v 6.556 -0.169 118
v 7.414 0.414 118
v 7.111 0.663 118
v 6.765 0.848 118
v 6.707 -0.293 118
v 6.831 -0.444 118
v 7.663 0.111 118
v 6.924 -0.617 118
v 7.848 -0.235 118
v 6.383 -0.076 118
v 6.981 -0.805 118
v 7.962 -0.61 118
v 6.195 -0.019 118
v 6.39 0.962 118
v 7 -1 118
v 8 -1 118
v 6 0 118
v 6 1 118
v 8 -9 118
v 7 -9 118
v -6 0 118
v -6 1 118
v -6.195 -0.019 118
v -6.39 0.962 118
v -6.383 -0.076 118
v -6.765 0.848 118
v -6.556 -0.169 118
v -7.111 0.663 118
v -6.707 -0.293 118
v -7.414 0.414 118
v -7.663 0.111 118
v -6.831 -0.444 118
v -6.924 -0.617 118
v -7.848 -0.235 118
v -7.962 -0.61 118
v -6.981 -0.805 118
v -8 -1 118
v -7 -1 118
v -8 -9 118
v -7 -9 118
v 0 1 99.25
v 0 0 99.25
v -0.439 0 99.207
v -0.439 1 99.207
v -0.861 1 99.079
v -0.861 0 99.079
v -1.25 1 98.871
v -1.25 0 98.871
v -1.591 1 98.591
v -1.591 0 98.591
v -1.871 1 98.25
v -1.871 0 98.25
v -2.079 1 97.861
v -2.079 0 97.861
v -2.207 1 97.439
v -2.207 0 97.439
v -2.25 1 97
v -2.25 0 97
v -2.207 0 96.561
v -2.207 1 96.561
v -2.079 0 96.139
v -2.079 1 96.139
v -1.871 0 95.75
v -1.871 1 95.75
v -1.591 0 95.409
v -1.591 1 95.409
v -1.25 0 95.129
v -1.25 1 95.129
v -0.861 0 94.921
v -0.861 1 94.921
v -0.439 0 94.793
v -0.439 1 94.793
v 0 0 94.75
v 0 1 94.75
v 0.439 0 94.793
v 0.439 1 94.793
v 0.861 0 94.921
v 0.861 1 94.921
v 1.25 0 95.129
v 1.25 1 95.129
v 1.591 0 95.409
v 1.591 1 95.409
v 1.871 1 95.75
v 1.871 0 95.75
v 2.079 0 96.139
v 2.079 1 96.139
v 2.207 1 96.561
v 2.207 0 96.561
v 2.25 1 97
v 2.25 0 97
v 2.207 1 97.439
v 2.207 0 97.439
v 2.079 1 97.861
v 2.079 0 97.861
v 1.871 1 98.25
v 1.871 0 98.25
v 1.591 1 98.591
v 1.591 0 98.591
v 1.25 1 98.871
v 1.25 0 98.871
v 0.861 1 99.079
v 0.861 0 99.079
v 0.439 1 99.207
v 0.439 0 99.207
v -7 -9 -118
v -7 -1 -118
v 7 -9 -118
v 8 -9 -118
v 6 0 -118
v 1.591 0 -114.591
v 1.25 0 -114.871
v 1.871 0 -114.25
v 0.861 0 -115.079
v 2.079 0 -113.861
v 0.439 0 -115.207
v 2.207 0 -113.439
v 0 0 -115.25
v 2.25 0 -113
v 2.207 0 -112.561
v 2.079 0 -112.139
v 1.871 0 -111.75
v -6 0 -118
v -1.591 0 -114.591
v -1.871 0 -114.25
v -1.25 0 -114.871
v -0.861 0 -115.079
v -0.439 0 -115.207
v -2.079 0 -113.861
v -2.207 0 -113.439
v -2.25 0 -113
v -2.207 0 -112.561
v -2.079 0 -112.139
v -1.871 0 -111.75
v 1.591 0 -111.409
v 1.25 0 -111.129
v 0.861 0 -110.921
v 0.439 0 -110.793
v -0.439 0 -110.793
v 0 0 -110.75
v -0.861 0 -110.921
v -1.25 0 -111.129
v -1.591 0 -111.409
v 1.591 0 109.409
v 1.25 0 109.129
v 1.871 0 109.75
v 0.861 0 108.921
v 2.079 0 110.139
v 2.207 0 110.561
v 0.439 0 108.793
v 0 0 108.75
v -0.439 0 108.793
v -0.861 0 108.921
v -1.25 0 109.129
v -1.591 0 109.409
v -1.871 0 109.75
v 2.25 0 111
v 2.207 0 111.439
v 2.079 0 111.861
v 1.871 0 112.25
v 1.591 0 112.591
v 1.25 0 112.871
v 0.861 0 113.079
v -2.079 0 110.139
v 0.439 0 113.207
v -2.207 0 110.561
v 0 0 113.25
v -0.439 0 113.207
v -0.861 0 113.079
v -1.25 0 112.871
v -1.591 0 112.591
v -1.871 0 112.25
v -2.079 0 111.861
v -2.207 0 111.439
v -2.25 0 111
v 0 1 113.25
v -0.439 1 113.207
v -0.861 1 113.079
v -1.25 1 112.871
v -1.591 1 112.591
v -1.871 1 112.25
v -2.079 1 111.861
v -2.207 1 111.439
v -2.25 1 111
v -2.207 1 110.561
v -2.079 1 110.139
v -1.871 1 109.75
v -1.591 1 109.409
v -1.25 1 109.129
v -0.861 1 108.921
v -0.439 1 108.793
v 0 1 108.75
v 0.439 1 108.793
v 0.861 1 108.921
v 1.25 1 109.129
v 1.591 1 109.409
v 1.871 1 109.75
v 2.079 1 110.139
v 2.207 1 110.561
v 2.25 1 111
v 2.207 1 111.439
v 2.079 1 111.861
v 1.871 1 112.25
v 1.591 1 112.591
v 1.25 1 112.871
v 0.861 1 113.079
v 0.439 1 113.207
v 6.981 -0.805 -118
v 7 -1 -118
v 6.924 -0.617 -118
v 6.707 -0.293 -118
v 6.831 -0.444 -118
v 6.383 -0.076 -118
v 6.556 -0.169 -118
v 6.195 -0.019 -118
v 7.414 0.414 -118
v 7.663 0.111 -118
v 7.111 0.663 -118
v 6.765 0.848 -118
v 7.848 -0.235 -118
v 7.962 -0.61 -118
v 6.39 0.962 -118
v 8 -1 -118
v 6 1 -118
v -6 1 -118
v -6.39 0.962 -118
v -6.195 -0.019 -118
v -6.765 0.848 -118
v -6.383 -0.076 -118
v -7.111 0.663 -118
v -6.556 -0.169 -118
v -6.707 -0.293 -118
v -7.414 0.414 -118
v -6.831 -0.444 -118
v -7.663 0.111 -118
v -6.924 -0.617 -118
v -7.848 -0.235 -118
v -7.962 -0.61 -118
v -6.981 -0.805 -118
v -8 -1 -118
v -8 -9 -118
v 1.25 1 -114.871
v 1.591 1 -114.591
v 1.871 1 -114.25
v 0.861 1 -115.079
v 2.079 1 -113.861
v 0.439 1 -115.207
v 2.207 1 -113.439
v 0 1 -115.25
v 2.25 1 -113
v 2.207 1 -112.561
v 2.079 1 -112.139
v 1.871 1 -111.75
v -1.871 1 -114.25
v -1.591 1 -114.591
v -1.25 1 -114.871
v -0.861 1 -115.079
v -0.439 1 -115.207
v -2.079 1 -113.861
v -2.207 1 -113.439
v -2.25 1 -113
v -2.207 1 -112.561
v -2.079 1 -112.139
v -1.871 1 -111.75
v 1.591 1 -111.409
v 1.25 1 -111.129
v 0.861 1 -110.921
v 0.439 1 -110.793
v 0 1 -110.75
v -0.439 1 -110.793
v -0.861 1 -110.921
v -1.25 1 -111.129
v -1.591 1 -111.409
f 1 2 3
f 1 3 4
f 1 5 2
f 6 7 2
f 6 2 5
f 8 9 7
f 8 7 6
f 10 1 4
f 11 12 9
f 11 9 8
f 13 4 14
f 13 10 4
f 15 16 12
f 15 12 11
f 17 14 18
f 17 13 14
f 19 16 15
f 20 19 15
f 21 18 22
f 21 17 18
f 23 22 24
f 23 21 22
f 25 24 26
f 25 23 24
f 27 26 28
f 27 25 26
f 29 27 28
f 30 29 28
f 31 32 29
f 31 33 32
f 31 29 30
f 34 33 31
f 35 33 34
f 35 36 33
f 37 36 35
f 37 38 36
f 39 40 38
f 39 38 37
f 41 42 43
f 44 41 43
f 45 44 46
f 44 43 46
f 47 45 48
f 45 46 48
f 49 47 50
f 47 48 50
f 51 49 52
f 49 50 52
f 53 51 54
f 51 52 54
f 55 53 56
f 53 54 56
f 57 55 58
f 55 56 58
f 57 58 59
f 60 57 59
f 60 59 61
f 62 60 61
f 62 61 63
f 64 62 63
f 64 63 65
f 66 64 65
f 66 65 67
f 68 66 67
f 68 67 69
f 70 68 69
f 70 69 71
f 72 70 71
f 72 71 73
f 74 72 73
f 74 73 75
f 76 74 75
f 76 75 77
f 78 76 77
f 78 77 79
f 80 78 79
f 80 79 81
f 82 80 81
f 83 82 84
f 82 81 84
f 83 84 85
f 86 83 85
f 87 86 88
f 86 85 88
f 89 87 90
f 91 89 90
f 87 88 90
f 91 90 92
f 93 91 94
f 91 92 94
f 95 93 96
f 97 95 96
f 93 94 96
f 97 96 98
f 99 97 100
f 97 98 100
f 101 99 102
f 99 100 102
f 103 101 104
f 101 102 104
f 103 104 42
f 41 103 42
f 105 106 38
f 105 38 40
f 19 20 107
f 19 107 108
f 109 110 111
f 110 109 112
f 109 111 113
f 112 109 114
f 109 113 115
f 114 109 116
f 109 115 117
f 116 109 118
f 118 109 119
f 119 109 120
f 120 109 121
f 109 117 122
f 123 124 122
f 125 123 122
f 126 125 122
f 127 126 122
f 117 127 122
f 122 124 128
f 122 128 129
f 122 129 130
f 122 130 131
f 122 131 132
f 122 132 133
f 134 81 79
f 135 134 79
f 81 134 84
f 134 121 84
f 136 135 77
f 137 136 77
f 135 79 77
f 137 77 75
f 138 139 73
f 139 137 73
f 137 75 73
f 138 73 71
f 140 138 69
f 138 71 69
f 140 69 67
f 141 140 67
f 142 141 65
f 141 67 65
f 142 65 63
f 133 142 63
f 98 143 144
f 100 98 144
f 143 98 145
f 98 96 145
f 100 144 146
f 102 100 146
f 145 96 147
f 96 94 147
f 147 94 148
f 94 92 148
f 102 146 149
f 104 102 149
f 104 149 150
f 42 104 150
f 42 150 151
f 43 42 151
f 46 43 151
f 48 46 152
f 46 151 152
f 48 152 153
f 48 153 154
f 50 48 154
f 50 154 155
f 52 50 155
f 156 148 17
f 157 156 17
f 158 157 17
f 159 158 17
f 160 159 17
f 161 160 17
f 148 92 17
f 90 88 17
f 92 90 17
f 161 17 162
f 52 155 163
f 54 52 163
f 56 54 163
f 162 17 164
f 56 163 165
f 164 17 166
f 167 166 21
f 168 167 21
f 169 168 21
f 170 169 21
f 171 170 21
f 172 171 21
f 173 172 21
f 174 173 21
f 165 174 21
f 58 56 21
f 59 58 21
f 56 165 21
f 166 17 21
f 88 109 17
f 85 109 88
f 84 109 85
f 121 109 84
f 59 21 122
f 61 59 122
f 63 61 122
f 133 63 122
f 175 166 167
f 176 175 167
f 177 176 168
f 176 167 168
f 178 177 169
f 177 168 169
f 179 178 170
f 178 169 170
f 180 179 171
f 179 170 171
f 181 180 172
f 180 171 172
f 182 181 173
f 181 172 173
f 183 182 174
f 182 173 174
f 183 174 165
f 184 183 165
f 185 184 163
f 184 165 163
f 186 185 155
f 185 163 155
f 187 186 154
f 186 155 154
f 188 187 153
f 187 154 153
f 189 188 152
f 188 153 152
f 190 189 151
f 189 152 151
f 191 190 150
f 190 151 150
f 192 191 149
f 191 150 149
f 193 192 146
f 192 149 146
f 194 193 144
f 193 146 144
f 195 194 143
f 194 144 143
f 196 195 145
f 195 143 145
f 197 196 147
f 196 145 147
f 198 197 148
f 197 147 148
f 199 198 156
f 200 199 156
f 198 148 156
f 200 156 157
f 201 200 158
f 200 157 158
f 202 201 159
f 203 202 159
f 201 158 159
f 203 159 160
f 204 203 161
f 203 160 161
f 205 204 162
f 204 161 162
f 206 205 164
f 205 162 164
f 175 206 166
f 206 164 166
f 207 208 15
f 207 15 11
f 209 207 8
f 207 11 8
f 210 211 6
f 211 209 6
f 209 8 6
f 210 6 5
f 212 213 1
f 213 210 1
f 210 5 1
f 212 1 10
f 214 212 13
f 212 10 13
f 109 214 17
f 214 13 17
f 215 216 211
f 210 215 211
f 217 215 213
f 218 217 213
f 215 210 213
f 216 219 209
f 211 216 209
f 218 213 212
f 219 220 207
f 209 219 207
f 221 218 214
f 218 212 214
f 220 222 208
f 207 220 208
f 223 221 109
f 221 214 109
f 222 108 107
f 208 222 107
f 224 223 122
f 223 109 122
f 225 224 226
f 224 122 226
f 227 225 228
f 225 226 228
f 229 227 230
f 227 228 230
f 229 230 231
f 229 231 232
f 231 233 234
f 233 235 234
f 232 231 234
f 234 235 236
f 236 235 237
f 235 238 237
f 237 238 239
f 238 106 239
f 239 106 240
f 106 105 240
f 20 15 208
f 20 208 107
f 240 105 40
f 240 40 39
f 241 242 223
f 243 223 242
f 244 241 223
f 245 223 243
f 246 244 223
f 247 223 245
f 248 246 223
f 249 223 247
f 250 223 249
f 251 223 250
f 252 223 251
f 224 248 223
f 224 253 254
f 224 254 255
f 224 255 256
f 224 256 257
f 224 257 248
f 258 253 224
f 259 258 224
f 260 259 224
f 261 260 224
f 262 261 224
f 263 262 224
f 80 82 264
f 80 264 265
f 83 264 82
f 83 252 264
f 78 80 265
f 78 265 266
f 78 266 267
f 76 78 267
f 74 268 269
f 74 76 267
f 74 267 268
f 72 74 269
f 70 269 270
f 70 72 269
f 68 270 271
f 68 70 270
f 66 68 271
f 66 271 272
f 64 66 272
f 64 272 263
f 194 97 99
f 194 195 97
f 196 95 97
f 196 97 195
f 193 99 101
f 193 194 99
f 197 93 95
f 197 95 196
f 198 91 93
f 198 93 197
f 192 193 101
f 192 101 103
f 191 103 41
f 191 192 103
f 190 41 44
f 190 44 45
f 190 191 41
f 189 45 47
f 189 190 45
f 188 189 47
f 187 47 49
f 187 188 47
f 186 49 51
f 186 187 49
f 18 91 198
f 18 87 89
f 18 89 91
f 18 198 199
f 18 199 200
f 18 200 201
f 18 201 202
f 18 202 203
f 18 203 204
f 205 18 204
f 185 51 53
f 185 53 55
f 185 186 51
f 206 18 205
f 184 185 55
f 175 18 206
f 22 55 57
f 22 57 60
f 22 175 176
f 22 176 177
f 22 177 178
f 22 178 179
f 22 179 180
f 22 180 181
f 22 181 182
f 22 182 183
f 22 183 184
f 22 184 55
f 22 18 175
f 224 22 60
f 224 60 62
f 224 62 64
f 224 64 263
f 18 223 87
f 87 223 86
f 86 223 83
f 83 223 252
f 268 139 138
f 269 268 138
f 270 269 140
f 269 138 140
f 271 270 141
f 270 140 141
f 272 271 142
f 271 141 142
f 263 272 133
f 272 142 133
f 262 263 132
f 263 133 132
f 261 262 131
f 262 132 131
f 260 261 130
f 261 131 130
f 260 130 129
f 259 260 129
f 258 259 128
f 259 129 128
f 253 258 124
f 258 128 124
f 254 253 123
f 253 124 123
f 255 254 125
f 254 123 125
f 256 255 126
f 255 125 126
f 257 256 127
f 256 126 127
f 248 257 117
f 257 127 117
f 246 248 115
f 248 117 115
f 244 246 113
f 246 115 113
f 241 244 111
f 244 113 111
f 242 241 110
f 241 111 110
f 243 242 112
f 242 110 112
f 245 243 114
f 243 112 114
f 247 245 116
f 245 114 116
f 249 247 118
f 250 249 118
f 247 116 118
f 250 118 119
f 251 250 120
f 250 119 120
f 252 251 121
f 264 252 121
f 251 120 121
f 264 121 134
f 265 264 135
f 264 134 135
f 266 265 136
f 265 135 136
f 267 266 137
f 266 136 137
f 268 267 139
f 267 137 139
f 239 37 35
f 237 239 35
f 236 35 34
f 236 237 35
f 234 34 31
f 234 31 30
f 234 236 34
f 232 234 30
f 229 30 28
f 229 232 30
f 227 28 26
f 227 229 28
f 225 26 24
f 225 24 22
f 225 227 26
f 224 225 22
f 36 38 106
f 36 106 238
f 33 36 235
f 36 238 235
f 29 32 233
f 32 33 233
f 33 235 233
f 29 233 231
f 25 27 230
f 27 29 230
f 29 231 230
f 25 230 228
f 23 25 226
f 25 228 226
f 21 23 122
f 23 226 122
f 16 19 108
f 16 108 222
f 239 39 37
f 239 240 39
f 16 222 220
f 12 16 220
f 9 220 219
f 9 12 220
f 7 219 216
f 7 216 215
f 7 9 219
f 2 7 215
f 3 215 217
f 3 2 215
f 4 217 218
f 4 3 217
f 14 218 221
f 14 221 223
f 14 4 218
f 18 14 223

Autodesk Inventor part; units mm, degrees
ref_plane "YZ Plane" through (0, 0, 0) normal (1, 0, 0) x (0, 1, 0)
ref_plane "XZ Plane" through (0, 0, 0) normal (0, 1, 0) x (-1, 0, 0)
ref_plane "XY Plane" through (0, 0, 0) normal (0, 0, 1) x (1, 0, 0)
sketch "Esquisse4" plane through (0, 0, 0) normal (0, 1, 0) x (-1, 0, 0)
  line L0 (-8, 118) -> (8, 118)
  line L1 (8, 118) -> (8, -118)
  line L2 (8, -118) -> (-8, -118)
  line L3 (-8, -118) -> (-8, 118)
  line L4 (-8, 118) -> (8, -118) construction
  line L5 (8, 118) -> (-8, -118) construction
  point P0 (0, 0)
  dimension "d26" = 16
  dimension "d27" = 236
extrude "Plaque3" add sketch "Esquisse4" along normal blind 1
sketch "Esquisse5" plane through (7, 1, 118) normal (1, 0, 0) x (0, 1, 0)
  line L0 (0, -236) -> (0, 0)
  line L1 (0, 0) -> (-10, 0)
  line L2 (-10, 0) -> (-10, -236)
  line L3 (-10, -236) -> (0, -236)
edge flange "Bord tombé2" height 10 angle 90 thickness 1 bend radius 1 thickness toward (1, 0, 0) relief tear relief width 1 relief depth 0.5 corner gap 1 corner form 0 edges at (8, 0, 0) (-8, 0, 0) wall of the first edge with corners at (7, 1, -118) (7, 1, 118) (7, -9, 118) (7, -9, -118)
bend "Pli2"
corner "Coin2"
sketch "Esquisse6" plane through (0, 1, 0) normal (0, 1, 0) x (1, 0, 0)
  line L0 (-6, 118) -> (6, 118) projected
  point P0 (0, 0)
  point P1 (0, 113)
  point P2 (0, 118)
  dimension "d39" = 5
hole "Perçage2" at (0, 1, -113) direction (0, -1, 0) diameter 4.5 depth 1 clearance for "Vis d'assemblage à six pans creux ISO 4762" size "M4" standard "ISO"
sketch "Esquisse7" plane through (0, 1, 0) normal (0, 1, 0) x (1, 0, 0)
  line L0 (-6, 118) -> (6, 118) projected
  point P0 (0, 0)
  point P1 (0, -97)
  point P2 (0, -111)
  dimension "d50" = 215
  dimension "d51" = 14
hole "Perçage3" at (0, 1, 97) at (0, 1, 111) direction (0, -1, 0) diameter 4.5 depth 1 clearance for "Vis d'assemblage à six pans creux ISO 4762" size "M4" standard "ISO"
equation "\"d45\" = Epaisseur"
equation "\"d57\" = Epaisseur"
equation "\"d28\" = Epaisseur"
equation "\"d29\" = LargeurGrugeage"
equation "\"d30\" = ProfondeurGrugeage"
equation "\"d31\" = RestesMinimum"
equation "\"d32\" = Rayondetransition"
equation "\"d35\" = RayonPli"
equation "\"d36\" = TailleGrugeage"
equation "\"d37\" = TailleJeu"
equation "\"d38\" = TailleRayonJacobi"
equation "\"RayonPli\" = Epaisseur"
equation "\"LargeurGrugeage\" = Epaisseur"
equation "\"ProfondeurGrugeage\" = 0.5 * Epaisseur"
equation "\"TailleGrugeage\" = 4 * Epaisseur"
equation "\"RestesMinimum\" = 2 * Epaisseur"
equation "\"Rayondetransition\" = RayonPli"
equation "\"TailleRayonJacobi\" = RayonPli"
equation "\"TailleJeu\" = Epaisseur"
equation "\"Epaisseur\" = 1"
properties part number "support_principal"
